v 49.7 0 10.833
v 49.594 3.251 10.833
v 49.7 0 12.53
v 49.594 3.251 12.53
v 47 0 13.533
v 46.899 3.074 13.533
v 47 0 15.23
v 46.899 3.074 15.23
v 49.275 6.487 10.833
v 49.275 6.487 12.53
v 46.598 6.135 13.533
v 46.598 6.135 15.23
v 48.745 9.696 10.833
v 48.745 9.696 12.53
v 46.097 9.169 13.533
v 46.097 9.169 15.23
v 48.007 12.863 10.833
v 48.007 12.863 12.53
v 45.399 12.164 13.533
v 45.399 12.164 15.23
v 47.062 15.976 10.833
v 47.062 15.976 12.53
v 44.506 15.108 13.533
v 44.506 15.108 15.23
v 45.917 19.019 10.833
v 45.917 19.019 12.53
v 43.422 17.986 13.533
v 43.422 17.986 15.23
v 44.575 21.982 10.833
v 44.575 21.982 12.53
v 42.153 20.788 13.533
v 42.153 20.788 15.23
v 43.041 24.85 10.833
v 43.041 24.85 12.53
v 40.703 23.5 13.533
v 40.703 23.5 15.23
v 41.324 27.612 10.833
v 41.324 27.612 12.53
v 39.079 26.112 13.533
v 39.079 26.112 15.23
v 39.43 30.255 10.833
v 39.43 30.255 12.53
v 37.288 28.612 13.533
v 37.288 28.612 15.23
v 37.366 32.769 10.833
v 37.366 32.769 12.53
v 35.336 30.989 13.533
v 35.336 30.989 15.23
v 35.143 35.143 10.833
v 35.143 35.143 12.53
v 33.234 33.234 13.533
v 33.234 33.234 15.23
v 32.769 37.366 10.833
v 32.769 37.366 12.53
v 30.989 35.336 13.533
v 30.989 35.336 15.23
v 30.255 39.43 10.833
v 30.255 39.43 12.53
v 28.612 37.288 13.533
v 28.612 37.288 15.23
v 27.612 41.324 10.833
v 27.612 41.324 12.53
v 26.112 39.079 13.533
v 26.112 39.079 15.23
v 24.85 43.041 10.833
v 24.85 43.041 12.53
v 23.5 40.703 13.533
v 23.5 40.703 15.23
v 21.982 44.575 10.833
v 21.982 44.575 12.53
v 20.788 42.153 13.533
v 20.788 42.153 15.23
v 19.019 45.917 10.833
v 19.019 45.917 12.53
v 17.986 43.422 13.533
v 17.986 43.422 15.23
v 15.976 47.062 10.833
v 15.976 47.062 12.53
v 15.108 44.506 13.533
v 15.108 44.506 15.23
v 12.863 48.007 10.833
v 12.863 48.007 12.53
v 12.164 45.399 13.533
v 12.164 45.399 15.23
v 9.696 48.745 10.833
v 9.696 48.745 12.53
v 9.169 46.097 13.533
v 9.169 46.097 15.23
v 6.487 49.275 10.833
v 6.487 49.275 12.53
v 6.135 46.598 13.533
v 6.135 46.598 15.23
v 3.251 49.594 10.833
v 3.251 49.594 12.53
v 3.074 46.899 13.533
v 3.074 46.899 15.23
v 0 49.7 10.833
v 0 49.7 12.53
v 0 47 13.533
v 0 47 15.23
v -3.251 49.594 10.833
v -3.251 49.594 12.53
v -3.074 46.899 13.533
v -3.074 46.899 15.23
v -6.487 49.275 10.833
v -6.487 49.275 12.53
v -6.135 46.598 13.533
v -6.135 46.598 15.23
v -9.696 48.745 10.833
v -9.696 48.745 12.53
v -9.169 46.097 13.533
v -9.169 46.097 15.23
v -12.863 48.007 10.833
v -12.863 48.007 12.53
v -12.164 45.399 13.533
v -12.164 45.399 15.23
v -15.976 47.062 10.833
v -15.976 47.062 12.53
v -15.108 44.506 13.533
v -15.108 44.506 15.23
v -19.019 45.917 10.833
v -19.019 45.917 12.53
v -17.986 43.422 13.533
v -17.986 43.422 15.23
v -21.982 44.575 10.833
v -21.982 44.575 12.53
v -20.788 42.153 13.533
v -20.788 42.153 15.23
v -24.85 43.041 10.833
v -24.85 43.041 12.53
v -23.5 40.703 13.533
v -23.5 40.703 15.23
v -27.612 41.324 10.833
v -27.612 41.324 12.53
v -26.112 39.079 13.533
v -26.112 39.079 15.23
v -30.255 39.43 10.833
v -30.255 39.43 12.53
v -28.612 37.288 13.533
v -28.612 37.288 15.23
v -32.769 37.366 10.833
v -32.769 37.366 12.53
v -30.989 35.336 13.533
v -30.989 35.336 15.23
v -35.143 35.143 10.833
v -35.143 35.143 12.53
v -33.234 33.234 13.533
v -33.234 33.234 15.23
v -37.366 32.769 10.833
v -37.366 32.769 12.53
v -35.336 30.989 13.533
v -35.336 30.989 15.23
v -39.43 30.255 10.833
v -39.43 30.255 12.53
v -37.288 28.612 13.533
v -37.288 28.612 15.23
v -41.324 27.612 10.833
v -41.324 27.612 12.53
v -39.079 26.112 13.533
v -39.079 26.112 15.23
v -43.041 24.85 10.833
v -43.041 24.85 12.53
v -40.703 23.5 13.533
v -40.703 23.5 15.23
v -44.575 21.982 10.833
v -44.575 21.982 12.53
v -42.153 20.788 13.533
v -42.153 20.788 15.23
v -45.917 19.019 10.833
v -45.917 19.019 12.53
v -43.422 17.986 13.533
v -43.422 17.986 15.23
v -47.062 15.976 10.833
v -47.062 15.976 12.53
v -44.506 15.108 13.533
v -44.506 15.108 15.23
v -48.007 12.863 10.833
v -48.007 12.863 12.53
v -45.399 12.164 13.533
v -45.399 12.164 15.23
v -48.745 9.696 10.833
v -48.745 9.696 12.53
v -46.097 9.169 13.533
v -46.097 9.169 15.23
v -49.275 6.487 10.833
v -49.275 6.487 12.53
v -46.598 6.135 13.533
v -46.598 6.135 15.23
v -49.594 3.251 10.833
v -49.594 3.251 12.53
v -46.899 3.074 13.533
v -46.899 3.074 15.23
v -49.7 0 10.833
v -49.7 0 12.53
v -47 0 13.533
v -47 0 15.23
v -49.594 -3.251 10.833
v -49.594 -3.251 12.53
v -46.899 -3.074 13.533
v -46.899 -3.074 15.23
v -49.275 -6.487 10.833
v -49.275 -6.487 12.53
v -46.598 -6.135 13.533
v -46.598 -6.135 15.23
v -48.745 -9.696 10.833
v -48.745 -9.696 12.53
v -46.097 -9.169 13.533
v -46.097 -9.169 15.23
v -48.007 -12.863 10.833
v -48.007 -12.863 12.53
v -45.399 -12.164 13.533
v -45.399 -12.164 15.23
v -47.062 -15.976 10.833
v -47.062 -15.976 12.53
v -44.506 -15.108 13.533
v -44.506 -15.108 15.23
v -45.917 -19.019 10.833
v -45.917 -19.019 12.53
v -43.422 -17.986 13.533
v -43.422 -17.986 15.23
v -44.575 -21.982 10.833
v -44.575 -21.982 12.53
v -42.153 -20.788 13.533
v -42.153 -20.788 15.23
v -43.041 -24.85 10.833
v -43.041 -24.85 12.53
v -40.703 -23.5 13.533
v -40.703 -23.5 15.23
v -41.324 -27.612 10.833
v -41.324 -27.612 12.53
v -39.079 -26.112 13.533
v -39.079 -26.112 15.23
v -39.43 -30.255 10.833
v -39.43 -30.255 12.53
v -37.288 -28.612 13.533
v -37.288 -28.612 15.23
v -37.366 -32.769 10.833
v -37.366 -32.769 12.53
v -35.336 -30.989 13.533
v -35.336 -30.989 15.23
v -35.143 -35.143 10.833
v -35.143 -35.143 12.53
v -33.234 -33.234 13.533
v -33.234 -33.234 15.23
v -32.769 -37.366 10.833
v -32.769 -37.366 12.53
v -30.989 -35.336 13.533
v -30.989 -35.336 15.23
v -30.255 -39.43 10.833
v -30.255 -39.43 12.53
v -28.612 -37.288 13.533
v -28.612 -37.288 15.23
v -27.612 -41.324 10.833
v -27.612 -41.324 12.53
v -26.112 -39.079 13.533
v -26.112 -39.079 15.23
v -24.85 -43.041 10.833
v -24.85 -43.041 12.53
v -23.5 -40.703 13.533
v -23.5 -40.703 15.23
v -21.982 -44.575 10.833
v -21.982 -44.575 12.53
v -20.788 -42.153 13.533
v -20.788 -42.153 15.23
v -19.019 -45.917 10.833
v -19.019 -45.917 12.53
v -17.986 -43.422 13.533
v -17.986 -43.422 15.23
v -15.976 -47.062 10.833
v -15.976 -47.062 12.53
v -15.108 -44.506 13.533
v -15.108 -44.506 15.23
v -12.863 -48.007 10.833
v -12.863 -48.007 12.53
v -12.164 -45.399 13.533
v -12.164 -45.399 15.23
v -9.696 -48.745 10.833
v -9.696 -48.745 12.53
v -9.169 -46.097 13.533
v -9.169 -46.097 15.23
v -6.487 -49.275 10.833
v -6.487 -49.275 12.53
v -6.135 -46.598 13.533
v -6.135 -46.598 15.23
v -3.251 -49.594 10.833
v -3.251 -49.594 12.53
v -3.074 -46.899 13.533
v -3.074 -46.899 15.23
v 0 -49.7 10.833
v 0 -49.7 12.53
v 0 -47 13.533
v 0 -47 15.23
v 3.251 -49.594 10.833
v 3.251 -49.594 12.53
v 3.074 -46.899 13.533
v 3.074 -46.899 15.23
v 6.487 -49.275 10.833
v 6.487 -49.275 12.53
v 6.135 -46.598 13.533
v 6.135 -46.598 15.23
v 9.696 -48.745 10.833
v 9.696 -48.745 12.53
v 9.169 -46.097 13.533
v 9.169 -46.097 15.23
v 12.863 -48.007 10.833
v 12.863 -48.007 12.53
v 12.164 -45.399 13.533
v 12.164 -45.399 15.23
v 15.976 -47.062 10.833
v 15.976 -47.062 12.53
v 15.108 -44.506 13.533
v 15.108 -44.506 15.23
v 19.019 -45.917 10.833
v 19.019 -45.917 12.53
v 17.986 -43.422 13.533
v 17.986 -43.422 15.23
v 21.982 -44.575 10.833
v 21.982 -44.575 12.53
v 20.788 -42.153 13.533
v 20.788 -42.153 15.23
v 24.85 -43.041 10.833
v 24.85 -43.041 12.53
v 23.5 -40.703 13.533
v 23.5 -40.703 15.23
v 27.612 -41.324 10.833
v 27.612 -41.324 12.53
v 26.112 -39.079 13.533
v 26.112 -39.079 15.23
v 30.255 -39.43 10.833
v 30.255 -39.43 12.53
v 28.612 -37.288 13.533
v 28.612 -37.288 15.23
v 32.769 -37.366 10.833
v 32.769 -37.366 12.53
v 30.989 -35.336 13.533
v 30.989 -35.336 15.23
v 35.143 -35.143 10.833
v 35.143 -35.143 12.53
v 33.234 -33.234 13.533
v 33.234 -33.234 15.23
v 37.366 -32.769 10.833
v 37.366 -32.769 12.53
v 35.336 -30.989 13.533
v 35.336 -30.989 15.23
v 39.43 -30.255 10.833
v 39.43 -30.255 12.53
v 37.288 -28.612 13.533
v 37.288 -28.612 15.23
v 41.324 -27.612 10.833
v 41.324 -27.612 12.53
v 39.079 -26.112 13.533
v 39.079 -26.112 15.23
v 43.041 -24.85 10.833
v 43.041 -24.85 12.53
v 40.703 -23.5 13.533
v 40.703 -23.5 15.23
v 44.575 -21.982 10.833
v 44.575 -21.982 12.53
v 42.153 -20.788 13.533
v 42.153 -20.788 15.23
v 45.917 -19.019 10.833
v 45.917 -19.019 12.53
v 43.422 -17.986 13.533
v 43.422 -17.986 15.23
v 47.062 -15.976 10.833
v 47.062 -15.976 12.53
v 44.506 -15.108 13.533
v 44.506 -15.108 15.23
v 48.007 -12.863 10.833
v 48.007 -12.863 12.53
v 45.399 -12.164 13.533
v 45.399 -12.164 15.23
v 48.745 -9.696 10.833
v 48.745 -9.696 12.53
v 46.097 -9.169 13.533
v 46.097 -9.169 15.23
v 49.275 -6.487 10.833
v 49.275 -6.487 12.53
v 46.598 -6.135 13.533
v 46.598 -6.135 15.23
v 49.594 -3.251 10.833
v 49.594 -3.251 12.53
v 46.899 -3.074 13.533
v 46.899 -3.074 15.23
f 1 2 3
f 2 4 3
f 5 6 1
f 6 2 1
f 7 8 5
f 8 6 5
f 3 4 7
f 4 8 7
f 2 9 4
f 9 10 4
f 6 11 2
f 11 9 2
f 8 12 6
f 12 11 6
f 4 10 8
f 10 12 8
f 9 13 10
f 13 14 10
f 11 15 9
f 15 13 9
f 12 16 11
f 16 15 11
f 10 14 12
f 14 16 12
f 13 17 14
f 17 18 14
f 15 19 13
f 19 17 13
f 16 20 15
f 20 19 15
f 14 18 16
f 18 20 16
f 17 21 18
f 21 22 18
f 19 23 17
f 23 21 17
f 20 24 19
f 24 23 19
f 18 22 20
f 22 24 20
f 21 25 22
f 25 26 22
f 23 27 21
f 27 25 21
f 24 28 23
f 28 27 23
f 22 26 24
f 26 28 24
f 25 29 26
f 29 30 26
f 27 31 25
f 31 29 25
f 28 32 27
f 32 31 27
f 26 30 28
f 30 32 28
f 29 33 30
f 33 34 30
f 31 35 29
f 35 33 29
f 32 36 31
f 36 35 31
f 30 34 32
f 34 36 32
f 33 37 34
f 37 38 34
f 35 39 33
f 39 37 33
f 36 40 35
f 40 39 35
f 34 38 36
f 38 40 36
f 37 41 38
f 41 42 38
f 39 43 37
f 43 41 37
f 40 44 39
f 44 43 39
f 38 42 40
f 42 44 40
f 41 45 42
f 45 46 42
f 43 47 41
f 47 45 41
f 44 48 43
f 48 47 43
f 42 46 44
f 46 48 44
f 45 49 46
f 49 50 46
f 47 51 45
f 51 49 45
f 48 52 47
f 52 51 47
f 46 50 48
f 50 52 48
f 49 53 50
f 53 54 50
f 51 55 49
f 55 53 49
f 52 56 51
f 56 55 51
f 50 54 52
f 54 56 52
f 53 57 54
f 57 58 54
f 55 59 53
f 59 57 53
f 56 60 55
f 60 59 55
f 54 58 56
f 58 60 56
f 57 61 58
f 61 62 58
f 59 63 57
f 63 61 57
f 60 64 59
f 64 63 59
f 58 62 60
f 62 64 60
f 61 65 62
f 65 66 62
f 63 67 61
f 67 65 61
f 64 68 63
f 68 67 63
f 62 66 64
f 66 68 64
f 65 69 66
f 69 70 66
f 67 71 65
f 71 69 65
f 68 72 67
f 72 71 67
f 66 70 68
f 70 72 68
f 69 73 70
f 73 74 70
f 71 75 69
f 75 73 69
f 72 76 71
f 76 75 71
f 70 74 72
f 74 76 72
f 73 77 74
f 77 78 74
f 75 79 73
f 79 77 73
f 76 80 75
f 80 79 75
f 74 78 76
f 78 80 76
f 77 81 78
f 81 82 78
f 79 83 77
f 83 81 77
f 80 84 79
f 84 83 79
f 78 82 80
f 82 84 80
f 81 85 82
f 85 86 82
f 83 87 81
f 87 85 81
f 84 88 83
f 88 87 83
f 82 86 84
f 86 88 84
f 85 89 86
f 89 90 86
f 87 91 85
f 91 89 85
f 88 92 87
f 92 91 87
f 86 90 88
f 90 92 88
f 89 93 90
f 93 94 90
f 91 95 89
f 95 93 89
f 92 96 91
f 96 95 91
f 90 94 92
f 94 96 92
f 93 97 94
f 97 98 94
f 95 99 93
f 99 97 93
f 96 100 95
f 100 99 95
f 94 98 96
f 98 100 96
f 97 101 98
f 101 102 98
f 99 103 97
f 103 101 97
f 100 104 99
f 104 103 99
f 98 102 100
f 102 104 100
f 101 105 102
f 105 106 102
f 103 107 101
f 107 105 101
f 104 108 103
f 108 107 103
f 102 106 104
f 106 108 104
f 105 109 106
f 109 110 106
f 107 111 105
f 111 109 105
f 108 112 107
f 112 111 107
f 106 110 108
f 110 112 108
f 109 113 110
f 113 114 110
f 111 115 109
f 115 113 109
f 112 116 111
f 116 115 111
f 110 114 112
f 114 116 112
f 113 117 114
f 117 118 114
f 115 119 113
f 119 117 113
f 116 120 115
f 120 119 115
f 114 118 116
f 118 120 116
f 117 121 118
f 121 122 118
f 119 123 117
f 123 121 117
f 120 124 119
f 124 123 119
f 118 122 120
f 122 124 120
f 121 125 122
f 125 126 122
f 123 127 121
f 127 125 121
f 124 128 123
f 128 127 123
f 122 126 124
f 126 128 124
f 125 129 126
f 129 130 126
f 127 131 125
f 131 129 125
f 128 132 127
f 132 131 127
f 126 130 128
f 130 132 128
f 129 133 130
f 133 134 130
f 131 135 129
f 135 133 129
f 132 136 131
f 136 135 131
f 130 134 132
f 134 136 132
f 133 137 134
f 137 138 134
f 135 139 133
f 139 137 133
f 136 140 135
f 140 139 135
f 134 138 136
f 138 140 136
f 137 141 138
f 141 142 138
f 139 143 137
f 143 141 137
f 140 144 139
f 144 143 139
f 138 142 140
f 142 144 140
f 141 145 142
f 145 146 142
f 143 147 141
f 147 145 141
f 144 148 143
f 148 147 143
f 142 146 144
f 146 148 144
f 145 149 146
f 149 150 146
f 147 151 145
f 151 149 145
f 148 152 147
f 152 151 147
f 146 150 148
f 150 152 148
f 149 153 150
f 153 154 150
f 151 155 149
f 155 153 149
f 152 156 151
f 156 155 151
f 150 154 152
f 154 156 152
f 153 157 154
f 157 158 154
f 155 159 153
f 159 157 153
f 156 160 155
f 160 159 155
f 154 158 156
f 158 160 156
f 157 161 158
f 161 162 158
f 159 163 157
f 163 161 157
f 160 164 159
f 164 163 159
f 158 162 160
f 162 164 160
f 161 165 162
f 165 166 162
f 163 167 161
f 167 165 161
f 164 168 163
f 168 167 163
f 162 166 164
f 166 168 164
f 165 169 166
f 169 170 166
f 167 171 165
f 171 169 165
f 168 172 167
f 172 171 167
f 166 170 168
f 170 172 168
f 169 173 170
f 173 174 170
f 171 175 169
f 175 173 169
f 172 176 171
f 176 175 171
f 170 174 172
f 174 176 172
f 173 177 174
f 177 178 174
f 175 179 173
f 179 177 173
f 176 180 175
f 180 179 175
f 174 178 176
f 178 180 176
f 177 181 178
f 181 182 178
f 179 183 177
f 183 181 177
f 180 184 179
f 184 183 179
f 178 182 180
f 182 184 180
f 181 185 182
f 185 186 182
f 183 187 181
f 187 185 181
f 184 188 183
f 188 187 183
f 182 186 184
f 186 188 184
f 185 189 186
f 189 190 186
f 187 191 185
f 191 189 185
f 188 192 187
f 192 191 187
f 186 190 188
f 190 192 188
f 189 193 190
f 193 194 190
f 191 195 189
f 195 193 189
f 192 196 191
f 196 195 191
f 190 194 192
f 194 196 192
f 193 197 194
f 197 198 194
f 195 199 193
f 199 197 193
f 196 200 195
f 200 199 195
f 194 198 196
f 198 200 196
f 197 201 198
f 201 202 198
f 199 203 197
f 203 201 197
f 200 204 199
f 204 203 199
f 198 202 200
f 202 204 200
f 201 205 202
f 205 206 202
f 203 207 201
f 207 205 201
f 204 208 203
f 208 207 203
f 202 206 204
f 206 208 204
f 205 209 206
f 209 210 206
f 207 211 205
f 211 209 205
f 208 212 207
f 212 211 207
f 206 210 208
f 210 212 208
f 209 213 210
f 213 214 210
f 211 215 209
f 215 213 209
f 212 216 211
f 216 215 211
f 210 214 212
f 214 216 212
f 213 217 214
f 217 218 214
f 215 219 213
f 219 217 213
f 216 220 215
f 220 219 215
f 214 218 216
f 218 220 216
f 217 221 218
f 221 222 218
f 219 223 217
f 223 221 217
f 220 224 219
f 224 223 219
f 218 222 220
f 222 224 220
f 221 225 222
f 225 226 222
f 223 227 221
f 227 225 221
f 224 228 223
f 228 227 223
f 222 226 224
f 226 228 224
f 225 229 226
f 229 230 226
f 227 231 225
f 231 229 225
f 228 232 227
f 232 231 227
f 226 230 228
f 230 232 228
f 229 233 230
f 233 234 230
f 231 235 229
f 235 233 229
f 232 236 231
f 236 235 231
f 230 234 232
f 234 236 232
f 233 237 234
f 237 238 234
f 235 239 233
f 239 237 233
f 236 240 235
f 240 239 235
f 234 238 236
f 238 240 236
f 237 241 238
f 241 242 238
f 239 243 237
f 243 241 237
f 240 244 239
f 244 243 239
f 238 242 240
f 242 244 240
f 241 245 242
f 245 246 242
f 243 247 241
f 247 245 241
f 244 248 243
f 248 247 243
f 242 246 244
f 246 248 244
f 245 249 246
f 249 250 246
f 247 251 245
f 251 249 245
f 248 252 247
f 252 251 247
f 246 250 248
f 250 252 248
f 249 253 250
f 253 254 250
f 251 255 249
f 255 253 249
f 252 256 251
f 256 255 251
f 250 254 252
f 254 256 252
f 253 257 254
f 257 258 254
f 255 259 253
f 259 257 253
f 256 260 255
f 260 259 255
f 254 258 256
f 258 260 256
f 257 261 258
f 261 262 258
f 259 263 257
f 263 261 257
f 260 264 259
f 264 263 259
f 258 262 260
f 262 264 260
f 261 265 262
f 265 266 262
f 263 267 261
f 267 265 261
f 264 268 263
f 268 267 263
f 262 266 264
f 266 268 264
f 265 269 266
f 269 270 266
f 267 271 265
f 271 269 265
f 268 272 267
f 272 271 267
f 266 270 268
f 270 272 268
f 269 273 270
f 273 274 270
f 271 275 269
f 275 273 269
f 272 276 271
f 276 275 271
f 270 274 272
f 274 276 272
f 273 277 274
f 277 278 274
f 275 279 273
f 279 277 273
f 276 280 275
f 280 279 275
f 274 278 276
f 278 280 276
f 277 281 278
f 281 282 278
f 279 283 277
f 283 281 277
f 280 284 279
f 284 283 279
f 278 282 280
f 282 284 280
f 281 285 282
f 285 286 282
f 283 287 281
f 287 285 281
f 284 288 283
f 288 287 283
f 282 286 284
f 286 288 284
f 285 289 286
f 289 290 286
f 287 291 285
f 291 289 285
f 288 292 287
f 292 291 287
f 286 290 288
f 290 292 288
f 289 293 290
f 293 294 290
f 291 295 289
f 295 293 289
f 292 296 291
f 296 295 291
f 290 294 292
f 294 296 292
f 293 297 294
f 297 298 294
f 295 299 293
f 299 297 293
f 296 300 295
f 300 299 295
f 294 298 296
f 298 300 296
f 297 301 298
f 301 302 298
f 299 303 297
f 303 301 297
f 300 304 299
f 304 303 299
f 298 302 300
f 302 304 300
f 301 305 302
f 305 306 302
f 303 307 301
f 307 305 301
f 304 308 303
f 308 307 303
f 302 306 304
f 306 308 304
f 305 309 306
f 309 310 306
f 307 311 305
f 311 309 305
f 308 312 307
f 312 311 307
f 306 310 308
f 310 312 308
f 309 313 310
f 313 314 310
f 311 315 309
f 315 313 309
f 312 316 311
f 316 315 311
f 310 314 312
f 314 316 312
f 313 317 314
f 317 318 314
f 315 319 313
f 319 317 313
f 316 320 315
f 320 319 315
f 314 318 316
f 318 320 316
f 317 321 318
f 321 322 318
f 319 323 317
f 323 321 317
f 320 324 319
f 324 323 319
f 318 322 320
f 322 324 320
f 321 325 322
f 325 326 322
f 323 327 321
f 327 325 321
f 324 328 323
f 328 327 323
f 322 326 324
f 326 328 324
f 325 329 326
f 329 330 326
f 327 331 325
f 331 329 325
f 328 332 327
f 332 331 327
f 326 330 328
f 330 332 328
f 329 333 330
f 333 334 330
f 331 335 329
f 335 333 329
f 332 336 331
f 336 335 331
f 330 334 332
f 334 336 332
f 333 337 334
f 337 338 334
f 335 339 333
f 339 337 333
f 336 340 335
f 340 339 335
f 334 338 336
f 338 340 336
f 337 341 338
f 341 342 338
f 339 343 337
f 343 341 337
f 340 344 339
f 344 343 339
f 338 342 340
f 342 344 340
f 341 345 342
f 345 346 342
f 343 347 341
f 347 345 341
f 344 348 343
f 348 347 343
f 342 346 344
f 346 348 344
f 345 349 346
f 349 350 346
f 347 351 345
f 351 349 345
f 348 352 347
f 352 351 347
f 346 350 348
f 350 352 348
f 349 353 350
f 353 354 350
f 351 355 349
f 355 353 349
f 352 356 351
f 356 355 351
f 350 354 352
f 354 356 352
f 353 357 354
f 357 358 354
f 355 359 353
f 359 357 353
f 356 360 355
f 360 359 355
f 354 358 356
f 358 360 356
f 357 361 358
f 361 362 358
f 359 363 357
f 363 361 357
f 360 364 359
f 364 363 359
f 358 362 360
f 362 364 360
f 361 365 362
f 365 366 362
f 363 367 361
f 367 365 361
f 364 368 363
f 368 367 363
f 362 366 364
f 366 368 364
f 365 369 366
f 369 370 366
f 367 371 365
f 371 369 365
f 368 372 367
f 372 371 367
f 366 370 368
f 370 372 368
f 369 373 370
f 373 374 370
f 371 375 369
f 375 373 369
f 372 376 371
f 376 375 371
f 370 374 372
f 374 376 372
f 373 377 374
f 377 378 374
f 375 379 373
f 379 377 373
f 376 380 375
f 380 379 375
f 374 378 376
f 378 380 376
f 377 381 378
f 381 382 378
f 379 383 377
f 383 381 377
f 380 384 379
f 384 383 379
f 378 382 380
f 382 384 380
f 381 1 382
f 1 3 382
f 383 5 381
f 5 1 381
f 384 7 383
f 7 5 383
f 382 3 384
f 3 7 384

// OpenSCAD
include <../lib/servo-duct-manifold-lib.scad>;
$fn = 96;
hub_gasket();
